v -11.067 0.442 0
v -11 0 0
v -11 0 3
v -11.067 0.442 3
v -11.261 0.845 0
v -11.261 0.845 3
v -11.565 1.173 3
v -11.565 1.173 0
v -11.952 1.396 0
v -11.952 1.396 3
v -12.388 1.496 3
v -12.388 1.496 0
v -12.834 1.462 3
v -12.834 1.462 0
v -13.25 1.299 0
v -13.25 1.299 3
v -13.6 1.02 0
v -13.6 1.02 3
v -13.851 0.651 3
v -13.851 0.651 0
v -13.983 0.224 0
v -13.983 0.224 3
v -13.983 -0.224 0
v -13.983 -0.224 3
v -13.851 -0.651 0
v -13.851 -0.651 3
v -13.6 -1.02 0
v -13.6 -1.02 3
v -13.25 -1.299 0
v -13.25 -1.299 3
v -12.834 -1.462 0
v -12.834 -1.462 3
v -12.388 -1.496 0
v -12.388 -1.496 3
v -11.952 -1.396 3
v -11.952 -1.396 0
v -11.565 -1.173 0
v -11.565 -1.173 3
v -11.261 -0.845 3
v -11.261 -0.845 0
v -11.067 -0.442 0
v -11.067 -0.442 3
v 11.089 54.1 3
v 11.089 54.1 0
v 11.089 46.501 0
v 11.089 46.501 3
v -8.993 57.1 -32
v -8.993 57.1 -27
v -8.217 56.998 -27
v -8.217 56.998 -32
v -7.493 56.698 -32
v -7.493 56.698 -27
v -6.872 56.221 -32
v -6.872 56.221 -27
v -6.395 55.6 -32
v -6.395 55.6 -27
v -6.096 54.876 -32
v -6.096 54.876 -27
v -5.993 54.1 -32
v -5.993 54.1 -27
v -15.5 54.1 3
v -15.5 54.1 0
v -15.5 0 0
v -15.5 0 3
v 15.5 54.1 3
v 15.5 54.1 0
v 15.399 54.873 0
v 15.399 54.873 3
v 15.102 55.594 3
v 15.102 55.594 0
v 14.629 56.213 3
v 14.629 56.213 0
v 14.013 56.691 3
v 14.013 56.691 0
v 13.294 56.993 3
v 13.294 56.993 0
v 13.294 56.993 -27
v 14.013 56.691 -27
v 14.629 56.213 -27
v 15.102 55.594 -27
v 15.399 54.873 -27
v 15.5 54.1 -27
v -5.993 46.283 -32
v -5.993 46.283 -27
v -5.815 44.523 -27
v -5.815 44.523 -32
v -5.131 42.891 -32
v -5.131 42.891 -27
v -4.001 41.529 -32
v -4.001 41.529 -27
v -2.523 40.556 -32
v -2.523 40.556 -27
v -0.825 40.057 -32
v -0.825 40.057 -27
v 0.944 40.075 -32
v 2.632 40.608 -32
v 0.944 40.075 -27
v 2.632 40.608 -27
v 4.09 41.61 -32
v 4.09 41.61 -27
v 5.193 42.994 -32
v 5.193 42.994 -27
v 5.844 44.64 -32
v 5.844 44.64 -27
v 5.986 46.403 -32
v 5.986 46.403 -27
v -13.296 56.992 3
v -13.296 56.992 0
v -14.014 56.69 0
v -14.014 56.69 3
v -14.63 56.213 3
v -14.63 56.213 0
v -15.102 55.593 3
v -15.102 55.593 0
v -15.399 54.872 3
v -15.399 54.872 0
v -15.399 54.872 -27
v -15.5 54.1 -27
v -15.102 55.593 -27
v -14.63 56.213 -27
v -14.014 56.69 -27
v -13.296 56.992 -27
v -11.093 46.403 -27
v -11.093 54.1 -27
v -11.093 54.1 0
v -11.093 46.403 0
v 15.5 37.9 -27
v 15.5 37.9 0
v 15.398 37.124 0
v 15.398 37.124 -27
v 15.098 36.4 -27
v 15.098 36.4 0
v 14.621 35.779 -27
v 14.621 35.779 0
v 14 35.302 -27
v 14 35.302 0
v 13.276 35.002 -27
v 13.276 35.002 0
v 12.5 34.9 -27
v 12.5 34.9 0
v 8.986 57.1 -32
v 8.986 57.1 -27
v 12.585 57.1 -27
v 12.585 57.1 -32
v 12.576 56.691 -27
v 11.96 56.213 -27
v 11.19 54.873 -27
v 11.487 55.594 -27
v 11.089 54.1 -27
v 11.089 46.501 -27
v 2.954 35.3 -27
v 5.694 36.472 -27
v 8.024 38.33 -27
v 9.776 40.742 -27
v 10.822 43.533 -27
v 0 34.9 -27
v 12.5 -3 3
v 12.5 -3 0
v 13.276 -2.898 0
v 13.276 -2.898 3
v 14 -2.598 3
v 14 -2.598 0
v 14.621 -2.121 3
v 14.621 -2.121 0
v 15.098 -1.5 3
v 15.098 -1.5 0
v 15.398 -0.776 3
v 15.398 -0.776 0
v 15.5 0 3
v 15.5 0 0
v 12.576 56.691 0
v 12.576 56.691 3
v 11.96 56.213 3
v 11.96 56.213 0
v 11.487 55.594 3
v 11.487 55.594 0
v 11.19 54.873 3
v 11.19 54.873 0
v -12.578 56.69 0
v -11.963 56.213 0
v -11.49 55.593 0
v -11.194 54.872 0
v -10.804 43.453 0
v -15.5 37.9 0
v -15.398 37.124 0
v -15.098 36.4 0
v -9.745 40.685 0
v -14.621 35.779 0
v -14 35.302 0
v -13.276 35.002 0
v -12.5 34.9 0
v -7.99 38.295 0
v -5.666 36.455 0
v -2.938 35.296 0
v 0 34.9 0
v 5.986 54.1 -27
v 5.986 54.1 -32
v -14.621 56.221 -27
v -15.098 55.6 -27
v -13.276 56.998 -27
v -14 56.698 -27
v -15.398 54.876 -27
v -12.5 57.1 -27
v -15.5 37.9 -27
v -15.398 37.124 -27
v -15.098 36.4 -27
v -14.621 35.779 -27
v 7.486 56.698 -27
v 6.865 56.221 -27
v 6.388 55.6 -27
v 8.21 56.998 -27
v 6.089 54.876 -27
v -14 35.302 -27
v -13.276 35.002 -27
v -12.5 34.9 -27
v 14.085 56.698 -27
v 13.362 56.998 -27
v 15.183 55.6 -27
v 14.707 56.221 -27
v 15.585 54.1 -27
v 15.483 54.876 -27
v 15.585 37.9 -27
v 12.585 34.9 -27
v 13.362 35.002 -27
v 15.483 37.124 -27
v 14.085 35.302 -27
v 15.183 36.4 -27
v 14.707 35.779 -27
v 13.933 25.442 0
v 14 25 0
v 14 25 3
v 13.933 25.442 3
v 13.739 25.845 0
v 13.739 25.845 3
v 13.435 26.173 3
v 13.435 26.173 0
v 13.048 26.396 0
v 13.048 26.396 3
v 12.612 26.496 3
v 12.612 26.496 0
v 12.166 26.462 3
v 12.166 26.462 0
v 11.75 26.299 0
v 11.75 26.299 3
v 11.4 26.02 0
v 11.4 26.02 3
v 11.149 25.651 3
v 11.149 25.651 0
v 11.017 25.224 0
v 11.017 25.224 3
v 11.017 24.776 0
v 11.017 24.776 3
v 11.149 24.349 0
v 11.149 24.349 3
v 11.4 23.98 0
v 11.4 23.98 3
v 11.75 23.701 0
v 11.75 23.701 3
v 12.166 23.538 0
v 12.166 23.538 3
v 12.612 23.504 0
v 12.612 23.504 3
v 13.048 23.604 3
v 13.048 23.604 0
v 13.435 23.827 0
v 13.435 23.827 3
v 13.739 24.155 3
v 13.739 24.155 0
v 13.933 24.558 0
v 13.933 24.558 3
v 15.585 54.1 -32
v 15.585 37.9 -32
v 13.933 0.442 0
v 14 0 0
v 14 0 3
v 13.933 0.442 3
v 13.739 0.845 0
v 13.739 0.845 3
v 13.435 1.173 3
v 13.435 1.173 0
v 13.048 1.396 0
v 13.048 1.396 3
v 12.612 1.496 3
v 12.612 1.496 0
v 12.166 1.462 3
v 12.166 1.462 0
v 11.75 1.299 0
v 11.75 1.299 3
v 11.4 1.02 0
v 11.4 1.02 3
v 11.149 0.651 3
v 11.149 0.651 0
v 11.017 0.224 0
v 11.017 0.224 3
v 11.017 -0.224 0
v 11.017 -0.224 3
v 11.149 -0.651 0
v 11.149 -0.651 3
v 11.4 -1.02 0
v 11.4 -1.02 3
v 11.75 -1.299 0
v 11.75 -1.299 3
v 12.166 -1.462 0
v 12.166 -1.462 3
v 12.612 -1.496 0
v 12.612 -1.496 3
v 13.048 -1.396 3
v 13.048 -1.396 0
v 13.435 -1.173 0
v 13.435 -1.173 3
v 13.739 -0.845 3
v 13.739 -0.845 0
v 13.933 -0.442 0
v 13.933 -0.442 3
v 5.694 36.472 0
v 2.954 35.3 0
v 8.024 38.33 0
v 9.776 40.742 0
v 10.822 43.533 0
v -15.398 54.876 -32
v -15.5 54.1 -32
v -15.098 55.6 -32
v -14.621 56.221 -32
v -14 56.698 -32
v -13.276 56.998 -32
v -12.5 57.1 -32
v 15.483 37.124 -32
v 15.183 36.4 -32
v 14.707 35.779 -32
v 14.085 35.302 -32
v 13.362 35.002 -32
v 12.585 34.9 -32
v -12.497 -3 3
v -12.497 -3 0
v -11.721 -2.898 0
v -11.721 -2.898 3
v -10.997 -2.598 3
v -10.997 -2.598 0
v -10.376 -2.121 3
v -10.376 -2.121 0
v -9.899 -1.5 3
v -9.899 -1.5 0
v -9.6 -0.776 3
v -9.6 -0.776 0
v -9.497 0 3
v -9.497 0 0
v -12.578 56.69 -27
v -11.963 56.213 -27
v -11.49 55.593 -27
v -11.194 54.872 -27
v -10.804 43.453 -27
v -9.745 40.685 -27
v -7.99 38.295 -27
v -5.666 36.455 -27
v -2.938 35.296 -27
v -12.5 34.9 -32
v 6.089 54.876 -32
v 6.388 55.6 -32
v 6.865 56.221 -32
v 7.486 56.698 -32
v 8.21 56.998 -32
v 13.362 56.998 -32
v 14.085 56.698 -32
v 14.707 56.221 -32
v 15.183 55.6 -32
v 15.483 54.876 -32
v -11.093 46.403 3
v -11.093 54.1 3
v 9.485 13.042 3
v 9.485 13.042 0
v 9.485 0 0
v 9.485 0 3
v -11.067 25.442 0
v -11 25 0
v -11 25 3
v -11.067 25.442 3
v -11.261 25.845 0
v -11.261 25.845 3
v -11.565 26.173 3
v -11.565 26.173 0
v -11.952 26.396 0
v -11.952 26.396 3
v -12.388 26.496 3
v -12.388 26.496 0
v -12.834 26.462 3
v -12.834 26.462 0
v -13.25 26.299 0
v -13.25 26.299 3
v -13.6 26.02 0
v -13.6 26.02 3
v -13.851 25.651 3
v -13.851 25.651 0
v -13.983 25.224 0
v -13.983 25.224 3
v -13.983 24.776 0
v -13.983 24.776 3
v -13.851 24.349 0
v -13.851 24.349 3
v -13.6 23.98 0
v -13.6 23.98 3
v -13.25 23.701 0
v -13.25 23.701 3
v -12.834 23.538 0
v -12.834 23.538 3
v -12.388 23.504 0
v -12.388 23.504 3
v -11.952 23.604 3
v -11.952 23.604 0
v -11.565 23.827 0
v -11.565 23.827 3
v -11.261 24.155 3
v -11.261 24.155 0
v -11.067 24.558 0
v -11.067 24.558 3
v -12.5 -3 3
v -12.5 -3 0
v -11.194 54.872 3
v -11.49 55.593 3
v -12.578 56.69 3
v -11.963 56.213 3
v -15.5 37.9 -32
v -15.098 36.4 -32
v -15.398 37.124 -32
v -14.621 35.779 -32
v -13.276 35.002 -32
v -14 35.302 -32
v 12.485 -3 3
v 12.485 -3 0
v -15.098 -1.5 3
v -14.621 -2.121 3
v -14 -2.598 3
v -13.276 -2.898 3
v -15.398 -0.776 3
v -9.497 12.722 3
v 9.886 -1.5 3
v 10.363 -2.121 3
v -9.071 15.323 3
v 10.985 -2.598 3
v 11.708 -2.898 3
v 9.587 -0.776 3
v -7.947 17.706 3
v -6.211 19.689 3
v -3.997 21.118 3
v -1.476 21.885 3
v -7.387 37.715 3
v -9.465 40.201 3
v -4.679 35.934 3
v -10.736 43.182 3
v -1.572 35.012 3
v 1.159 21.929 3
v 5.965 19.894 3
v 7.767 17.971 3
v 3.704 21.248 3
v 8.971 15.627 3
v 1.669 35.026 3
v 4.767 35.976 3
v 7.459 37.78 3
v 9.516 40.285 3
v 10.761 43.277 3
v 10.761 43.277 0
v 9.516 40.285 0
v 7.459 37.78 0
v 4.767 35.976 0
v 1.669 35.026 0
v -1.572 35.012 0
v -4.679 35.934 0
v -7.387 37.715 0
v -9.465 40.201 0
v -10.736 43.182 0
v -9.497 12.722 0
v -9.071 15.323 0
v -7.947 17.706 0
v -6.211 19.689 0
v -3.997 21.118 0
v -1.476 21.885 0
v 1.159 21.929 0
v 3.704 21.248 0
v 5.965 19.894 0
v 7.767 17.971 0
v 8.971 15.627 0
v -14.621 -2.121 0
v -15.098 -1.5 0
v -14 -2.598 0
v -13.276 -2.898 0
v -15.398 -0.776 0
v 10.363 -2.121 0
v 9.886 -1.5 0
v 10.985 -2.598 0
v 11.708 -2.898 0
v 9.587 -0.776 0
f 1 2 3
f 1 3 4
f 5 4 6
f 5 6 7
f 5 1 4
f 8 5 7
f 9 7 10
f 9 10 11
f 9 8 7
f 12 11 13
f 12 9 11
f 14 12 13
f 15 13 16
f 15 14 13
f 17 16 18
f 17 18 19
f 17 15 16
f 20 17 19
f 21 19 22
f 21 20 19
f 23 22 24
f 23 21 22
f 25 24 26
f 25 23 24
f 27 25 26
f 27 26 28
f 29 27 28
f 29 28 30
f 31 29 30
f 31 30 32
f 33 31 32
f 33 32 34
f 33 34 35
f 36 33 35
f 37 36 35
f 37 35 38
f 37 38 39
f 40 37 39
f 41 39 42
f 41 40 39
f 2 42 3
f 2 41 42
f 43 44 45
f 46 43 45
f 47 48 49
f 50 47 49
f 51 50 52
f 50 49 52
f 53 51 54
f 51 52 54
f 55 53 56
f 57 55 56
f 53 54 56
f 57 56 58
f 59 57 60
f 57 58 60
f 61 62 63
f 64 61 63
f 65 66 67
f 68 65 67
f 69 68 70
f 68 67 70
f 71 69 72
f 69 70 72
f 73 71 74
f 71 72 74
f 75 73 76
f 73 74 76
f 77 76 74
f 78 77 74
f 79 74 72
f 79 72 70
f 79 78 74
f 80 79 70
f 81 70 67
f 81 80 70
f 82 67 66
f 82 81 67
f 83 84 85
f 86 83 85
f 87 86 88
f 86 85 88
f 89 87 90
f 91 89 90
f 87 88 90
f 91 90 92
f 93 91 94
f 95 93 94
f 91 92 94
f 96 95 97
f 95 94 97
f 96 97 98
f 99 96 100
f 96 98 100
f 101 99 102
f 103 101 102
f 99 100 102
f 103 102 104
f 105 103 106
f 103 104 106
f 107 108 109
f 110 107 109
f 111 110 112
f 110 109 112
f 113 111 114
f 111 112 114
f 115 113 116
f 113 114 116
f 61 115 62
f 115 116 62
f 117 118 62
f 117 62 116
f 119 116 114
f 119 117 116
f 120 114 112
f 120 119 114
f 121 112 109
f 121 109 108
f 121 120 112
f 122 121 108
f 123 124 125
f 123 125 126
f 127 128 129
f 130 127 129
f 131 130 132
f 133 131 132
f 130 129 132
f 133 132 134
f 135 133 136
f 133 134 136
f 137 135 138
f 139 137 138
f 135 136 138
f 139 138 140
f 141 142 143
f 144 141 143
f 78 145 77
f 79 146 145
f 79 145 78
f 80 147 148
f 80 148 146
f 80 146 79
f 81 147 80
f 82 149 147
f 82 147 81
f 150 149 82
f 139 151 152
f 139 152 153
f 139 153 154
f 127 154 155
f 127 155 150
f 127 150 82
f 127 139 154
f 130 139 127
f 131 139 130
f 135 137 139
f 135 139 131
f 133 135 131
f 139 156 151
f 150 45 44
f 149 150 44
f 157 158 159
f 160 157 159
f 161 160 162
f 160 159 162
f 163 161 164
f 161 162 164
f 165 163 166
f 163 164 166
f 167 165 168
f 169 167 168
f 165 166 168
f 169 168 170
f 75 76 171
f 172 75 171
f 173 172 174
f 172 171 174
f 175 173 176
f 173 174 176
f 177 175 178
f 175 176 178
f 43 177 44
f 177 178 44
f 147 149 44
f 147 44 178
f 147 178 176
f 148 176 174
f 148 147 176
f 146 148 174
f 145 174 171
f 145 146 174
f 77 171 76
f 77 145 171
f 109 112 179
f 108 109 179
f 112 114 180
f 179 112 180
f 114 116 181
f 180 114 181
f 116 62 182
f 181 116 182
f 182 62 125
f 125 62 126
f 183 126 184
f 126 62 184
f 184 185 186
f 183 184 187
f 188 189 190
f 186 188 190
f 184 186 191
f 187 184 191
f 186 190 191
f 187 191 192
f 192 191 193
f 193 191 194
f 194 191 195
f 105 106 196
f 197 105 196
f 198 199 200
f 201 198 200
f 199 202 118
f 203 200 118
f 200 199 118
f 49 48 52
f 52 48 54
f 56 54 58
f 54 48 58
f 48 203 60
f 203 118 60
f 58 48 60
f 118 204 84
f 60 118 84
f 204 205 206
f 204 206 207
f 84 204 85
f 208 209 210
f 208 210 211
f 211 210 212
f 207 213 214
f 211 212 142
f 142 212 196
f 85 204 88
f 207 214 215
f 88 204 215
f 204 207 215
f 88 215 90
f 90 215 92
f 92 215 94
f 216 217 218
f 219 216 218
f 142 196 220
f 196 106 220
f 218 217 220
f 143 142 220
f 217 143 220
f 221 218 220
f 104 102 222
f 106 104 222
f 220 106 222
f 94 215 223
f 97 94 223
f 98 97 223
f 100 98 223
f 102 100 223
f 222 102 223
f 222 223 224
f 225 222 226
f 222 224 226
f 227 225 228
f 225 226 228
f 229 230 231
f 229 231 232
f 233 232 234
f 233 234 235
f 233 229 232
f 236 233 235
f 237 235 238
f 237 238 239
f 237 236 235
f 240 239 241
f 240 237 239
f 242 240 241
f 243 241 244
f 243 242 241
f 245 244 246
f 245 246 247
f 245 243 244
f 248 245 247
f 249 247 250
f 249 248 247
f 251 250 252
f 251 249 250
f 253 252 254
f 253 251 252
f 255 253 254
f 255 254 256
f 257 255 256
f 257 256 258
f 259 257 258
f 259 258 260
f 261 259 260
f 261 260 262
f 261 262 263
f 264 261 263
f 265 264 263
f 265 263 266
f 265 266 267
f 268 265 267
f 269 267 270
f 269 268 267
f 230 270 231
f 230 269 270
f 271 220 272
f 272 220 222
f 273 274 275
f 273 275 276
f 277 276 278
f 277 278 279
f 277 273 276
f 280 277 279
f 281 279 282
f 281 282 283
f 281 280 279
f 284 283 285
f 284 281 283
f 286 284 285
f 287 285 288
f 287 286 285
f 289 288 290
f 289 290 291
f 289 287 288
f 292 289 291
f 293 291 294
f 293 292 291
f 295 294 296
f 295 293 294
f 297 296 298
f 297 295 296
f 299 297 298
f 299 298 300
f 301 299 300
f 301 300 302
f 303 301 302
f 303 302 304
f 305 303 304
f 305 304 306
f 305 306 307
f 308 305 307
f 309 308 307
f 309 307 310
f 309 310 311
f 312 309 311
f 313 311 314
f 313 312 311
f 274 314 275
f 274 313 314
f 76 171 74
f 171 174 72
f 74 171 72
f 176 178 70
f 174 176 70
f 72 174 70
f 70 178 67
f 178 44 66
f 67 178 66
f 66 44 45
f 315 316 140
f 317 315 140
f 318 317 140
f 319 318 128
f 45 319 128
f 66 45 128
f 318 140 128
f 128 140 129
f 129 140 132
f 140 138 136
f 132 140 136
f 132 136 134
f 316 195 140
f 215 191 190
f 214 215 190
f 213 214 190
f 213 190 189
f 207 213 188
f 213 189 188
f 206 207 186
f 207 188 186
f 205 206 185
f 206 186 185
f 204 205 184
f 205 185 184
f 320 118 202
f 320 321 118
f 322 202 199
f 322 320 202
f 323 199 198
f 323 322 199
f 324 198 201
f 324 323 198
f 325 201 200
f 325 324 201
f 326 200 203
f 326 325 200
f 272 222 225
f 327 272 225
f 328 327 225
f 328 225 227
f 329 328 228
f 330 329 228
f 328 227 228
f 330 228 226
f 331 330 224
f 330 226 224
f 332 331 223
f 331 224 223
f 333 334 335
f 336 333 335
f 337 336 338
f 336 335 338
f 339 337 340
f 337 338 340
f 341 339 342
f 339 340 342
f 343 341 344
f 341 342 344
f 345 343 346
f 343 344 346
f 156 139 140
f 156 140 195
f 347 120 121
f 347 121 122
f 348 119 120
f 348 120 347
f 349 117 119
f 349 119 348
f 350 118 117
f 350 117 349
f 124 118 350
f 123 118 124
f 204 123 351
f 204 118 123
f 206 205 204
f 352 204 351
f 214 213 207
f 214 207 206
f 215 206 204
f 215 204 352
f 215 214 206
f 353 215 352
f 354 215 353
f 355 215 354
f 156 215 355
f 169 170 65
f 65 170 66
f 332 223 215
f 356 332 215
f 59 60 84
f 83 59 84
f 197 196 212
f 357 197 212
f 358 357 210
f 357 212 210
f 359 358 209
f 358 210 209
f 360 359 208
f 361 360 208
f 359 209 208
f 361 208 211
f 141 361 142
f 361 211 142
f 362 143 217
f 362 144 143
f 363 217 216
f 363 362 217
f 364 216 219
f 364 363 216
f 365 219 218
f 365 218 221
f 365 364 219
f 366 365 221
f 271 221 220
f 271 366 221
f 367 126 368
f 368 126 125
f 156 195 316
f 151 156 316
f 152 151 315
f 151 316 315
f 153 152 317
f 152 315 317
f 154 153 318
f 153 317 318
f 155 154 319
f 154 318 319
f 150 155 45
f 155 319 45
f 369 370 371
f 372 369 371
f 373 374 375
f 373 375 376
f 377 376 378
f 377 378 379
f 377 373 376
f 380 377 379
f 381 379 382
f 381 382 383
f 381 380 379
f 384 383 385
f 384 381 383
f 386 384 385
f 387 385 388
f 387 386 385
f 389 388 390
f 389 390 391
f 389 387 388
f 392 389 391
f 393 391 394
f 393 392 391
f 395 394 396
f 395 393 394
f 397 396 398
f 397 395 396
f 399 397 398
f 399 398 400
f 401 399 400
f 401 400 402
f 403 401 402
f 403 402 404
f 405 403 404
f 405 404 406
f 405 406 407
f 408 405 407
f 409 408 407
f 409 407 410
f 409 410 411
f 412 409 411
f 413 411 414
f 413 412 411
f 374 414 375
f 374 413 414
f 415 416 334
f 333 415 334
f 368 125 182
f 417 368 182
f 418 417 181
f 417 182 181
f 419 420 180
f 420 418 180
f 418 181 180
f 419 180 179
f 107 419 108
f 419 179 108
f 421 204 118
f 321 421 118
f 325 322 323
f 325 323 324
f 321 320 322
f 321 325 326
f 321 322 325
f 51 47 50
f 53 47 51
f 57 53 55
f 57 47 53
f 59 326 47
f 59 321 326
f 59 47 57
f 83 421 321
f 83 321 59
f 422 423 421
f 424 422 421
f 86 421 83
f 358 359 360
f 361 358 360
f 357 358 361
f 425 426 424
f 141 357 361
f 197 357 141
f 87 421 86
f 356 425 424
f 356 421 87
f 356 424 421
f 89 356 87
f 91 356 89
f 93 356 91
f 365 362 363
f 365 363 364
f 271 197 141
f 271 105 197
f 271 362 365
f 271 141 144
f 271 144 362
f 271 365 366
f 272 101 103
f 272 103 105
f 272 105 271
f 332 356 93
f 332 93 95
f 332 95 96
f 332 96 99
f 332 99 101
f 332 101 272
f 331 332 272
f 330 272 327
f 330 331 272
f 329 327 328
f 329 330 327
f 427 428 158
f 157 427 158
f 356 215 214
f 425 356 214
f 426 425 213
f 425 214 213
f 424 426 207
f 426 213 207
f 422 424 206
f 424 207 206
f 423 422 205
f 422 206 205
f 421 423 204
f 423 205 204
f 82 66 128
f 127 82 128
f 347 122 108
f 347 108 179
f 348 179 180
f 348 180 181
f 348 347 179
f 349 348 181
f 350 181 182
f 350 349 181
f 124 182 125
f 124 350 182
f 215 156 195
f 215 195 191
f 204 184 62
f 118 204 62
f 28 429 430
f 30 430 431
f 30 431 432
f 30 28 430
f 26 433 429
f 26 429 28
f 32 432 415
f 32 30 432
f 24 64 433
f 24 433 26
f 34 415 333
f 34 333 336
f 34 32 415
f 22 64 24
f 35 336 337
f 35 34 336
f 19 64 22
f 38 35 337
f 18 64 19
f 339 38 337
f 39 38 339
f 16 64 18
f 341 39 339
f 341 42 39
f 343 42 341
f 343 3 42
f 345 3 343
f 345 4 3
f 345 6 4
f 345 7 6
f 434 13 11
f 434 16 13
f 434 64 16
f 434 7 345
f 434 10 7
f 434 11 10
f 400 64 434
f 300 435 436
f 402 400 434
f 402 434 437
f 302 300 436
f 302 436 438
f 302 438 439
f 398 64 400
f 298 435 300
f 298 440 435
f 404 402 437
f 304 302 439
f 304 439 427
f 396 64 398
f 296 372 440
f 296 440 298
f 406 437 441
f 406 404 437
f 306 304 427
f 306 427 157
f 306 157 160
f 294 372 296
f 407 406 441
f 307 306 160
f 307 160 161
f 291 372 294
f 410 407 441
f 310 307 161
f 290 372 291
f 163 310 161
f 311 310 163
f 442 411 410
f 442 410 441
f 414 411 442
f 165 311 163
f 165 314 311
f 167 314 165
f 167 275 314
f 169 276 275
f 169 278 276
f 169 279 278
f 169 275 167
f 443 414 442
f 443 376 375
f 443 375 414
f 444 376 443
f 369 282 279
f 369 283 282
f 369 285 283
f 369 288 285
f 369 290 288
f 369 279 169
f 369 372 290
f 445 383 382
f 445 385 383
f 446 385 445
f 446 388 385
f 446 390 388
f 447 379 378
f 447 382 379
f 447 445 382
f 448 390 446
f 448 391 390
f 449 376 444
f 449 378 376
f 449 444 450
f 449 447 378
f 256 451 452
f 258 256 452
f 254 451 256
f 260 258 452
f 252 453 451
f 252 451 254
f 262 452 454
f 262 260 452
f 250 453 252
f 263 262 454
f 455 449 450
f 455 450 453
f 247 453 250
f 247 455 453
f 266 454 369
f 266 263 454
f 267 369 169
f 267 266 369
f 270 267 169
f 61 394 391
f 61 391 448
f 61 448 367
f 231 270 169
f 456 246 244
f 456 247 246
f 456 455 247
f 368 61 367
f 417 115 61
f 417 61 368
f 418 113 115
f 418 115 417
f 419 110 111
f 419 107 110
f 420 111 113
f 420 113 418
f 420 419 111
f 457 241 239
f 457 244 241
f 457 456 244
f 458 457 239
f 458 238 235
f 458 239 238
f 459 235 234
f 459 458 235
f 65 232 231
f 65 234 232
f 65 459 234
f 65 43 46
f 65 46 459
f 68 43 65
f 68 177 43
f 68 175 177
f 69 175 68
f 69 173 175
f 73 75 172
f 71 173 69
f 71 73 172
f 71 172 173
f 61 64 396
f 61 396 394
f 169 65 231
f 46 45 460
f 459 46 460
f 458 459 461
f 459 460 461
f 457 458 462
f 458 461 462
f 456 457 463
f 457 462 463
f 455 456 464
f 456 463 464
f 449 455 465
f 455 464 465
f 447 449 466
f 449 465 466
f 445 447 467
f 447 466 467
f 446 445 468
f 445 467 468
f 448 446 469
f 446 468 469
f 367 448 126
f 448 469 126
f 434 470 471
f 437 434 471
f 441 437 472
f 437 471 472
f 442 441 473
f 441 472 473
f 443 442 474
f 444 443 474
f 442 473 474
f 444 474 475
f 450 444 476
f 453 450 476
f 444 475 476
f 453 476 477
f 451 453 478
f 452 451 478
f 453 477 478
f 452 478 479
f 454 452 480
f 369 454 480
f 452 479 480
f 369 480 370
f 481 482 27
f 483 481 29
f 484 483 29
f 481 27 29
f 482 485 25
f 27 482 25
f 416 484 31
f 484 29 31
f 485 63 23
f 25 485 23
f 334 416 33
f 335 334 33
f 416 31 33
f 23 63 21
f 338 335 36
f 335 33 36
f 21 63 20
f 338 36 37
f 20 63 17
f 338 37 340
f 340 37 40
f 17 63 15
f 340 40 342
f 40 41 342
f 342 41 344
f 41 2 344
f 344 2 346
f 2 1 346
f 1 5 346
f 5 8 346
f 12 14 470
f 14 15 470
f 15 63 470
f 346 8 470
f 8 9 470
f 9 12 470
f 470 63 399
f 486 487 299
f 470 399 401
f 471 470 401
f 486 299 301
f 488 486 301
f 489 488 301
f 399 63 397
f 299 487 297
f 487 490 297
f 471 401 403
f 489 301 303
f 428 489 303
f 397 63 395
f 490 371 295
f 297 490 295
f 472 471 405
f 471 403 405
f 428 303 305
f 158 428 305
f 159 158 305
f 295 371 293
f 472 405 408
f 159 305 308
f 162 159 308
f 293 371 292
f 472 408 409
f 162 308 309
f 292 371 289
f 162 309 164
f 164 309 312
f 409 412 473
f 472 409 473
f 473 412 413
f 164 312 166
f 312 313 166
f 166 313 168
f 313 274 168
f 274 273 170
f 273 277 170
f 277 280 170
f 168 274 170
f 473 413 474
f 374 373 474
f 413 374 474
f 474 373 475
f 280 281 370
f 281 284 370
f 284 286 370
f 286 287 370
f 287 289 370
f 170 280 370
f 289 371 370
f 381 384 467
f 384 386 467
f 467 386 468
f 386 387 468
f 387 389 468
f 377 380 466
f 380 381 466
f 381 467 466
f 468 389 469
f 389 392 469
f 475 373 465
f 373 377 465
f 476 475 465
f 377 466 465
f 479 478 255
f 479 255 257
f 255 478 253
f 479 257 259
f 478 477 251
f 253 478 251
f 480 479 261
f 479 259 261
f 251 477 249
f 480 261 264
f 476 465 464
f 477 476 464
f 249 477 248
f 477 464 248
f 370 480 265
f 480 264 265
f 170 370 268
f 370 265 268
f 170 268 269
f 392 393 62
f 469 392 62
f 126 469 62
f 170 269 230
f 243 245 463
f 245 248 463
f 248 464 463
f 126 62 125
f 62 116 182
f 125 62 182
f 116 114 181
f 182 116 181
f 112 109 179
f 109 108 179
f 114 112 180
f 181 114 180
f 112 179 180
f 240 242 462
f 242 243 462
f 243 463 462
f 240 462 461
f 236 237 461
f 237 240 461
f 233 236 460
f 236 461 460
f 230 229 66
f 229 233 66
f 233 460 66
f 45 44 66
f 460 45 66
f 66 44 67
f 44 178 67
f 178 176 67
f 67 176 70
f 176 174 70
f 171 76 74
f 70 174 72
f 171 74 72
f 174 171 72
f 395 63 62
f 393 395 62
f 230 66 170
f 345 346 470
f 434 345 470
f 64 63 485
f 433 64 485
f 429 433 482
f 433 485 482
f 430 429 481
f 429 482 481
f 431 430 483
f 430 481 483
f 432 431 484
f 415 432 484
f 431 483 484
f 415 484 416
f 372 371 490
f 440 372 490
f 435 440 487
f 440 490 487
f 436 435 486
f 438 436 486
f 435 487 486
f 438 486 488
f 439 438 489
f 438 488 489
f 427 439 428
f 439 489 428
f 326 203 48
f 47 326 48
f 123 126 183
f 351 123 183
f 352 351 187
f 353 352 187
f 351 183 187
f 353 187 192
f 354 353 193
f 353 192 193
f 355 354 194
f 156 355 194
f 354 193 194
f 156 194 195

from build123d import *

# Parameters (mm, degrees)
F0_R          = 1.5
F1_DEPTH      = 3
F3_DEPTH      = 27
F5_DEPTH      = 5
F6_F1_R       = 3
F6_F2_R       = 3
F6_2_T1_DEPTH = 42
F6_3_T1_DEPTH = 18
F6_4_T1_DEPTH = 42


# Not quite as in the source:
# - a fillet or chamfer that OpenCascade refuses, or shapes differently, is made with other operations: its cross-section is extruded or revolved along the edge and cut away or added


with BuildPart() as f1:
    # F0 (on Top) → F1 (new body)
    with BuildSketch(Plane.XY):
        with BuildLine():
            Line((-11.0926671237, 57.1), (-15.5, 57.1))
            Line((-15.5, 57.1), (-15.5, 0))
            ThreePointArc((-15.5, 0), (-14.6213203436, -2.1213203436), (-12.5, -3))
            Line((-12.5, -3), (-12.4973975552, -3))
            ThreePointArc((-12.4973975552, -3), (-10.3760772117, -2.1213203436), (-9.4973975552, 0))
            Line((-9.4973975552, 0), (-9.4973975552, 12.2776496511))
            ThreePointArc((-9.4973975552, 12.2776496511), (-9.5, 12.5), (-9.4973975552, 12.7223503489))
            ThreePointArc((-9.4973975552, 12.7223503489), (-0.1600853698, 21.9986510976), (9.4845111786, 13.0422616551))
            ThreePointArc((9.4845111786, 13.0422616551), (9.5, 12.5), (9.4845111786, 11.9577383449))
            Line((9.4845111786, 11.9577383449), (9.4845111786, 0))
            ThreePointArc((9.4845111786, 0), (10.3631908351, -2.1213203436), (12.4845111786, -3))
            Line((12.4845111786, -3), (12.5, -3))
            ThreePointArc((12.5, -3), (14.6213203436, -2.1213203436), (15.5, 0))
            Line((15.5, 0), (15.5, 57.1))
            Line((15.5, 57.1), (11.0886831726, 57.1))
            Line((11.0886831726, 57.1), (11.0886831726, 46.5011042794))
            ThreePointArc((11.0886831726, 46.5011042794), (0.0488899344, 34.9001076683), (-11.0926671237, 46.4034056054))
            Line((-11.0926671237, 46.4034056054), (-11.0926671237, 57.1))
        make_face()
        with Locations((-12.5, 0)):
            Circle(F0_R, mode=Mode.SUBTRACT)
        with Locations((-12.5, 25)):
            Circle(F0_R, mode=Mode.SUBTRACT)
        with Locations((12.5, 0)):
            Circle(F0_R, mode=Mode.SUBTRACT)
        with Locations((12.5, 25)):
            Circle(F0_R, mode=Mode.SUBTRACT)
        with BuildLine():
            ThreePointArc((-9.4973975552, 12.7223503489), (-9.5, 12.5), (-9.4973975552, 12.2776496511))
            Line((-9.4973975552, 12.2776496511), (-9.4973975552, 12.7223503489))
        make_face()
        with BuildLine():
            ThreePointArc((9.4845111786, 11.9577383449), (9.5, 12.5), (9.4845111786, 13.0422616551))
            Line((9.4845111786, 13.0422616551), (9.4845111786, 11.9577383449))
        make_face()
    extrude(amount=F1_DEPTH)

    # F6#3: fillet of radius 3 on 4 edges, made by hand

    # F6_3_s2 → F6_3_t1 (cut)
    with BuildSketch(Plane.XY.offset(-7.5)):
        with BuildLine():
            ThreePointArc((-12.5, 57.1), (-14.6213203436, 56.2213203436), (-15.5, 54.1))
            Line((-15.5, 54.1), (-15.5, 57.1))
            Line((-15.5, 57.1), (-12.5, 57.1))
        make_face()
        with BuildLine():
            ThreePointArc((-11.0926671237, 54.1), (-11.9713467802, 56.2213203436), (-14.0926671237, 57.1))
            Line((-14.0926671237, 57.1), (-11.0926671237, 57.1))
            Line((-11.0926671237, 57.1), (-11.0926671237, 54.1))
        make_face()
        with BuildLine():
            ThreePointArc((14.0886831726, 57.1), (11.967362829, 56.2213203436), (11.0886831726, 54.1))
            Line((11.0886831726, 54.1), (11.0886831726, 57.1))
            Line((11.0886831726, 57.1), (14.0886831726, 57.1))
        make_face()
        with BuildLine():
            ThreePointArc((15.5, 54.1), (14.6213203436, 56.2213203436), (12.5, 57.1))
            Line((12.5, 57.1), (15.5, 57.1))
            Line((15.5, 57.1), (15.5, 54.1))
        make_face()
    extrude(amount=F6_3_T1_DEPTH, mode=Mode.SUBTRACT)


with BuildPart() as f3:
    # F2 (on face) → F3 (new body)
    with BuildSketch(Plane(origin=(0, 0, 0), x_dir=(1, 0, 0), z_dir=(0, 0, -1))):
        with BuildLine():
            ThreePointArc((-11.0926671237, -46.4034056054), (-7.9902378632, -38.2950600982), (0, -34.9))
            Line((0, -34.9), (-12.5, -34.9))
            ThreePointArc((-12.5, -34.9), (-14.6213203436, -35.7786796564), (-15.5, -37.9))
            Line((-15.5, -37.9), (-15.5, -57.1))
            Line((-15.5, -57.1), (-11.0926671237, -57.1))
            Line((-11.0926671237, -57.1), (-11.0926671237, -46.4034056054))
        make_face()
    extrude(amount=F3_DEPTH)

    # F6#2: fillet of radius 3 on 2 edges, made by hand

    # F6_2_s2 → F6_2_t1 (cut)
    with BuildSketch(Plane.XY.offset(-34.5)):
        with BuildLine():
            ThreePointArc((-15.5, 54.1), (-14.6213203436, 56.2213203436), (-12.5, 57.1))
            Line((-12.5, 57.1), (-15.5, 57.1))
            Line((-15.5, 57.1), (-15.5, 54.1))
        make_face()
        with BuildLine():
            ThreePointArc((-14.0926671237, 57.1), (-11.9713467802, 56.2213203436), (-11.0926671237, 54.1))
            Line((-11.0926671237, 54.1), (-11.0926671237, 57.1))
            Line((-11.0926671237, 57.1), (-14.0926671237, 57.1))
        make_face()
    extrude(amount=F6_2_T1_DEPTH, mode=Mode.SUBTRACT)


with BuildPart() as f3b:
    # F2 (on face) → F3, piece 2 (new body)
    with BuildSketch(Plane(origin=(0, 0, 0), x_dir=(1, 0, 0), z_dir=(0, 0, -1))):
        with BuildLine():
            Line((12.5, -34.9), (0, -34.9))
            ThreePointArc((0, -34.9), (8.0240967561, -38.3303278265), (11.0886831726, -46.5011042794))
            Line((11.0886831726, -46.5011042794), (11.0886831726, -57.1))
            Line((11.0886831726, -57.1), (15.5, -57.1))
            Line((15.5, -57.1), (15.5, -37.9))
            ThreePointArc((15.5, -37.9), (14.6213203436, -35.7786796564), (12.5, -34.9))
        make_face()
    extrude(amount=F3_DEPTH)

    # F6#4: fillet of radius 3 on 2 edges, made by hand

    # F6_4_s2 → F6_4_t1 (cut)
    with BuildSketch(Plane.XY.offset(-34.5)):
        with BuildLine():
            ThreePointArc((11.0886831726, 54.1), (11.967362829, 56.2213203436), (14.0886831726, 57.1))
            Line((14.0886831726, 57.1), (11.0886831726, 57.1))
            Line((11.0886831726, 57.1), (11.0886831726, 54.1))
        make_face()
        with BuildLine():
            ThreePointArc((12.5, 57.1), (14.6213203436, 56.2213203436), (15.5, 54.1))
            Line((15.5, 54.1), (15.5, 57.1))
            Line((15.5, 57.1), (12.5, 57.1))
        make_face()
    extrude(amount=F6_4_T1_DEPTH, mode=Mode.SUBTRACT)


with BuildPart() as f5:
    # F4 (on face) → F5 (new body)
    with BuildSketch(Plane(origin=(0, 0, -27), x_dir=(1, 0, 0), z_dir=(0, 0, -1))):
        with BuildLine():
            ThreePointArc((-5.9933118892, -46.2832182873), (0.0601922838, -40.0003019335), (5.9864232992, -46.4034056054))
            Line((5.9864232992, -46.4034056054), (5.9864232992, -54.1))
            ThreePointArc((5.9864232992, -54.1), (6.8651029557, -56.2213203436), (8.9864232992, -57.1))
            Line((8.9864232992, -57.1), (15.5851934105, -57.1))
            Line((15.5851934105, -57.1), (15.5851934105, -37.9))
            ThreePointArc((15.5851934105, -37.9), (14.7065137541, -35.7786796564), (12.5851934105, -34.9))
            Line((12.5851934105, -34.9), (0, -34.9))
            Line((0, -34.9), (-12.5, -34.9))
            ThreePointArc((-12.5, -34.9), (-14.6213203436, -35.7786796564), (-15.5, -37.9))
            Line((-15.5, -37.9), (-15.5, -57.1))
            Line((-15.5, -57.1), (-8.9933118892, -57.1))
            ThreePointArc((-8.9933118892, -57.1), (-6.8719915457, -56.2213203436), (-5.9933118892, -54.1))
            Line((-5.9933118892, -54.1), (-5.9933118892, -46.2832182873))
        make_face()
    extrude(amount=F5_DEPTH)

    # F6: fillet of radius 3 on 2 edges, made by hand

    # F6_f1
    f6_f1_edges = [f5.edges().sort_by_distance(p)[0] for p in [
        (15.5851934105, 57.1, -29.5),
    ]]
    fillet(f6_f1_edges, radius=F6_F1_R)

    # F6_f2
    f6_f2_edges = [f5.edges().sort_by_distance(p)[0] for p in [
        (-15.5, 57.1, -29.5),
    ]]
    fillet(f6_f2_edges, radius=F6_F2_R)


solid = Compound([f1.part, f3.part, f3b.part, f5.part])
